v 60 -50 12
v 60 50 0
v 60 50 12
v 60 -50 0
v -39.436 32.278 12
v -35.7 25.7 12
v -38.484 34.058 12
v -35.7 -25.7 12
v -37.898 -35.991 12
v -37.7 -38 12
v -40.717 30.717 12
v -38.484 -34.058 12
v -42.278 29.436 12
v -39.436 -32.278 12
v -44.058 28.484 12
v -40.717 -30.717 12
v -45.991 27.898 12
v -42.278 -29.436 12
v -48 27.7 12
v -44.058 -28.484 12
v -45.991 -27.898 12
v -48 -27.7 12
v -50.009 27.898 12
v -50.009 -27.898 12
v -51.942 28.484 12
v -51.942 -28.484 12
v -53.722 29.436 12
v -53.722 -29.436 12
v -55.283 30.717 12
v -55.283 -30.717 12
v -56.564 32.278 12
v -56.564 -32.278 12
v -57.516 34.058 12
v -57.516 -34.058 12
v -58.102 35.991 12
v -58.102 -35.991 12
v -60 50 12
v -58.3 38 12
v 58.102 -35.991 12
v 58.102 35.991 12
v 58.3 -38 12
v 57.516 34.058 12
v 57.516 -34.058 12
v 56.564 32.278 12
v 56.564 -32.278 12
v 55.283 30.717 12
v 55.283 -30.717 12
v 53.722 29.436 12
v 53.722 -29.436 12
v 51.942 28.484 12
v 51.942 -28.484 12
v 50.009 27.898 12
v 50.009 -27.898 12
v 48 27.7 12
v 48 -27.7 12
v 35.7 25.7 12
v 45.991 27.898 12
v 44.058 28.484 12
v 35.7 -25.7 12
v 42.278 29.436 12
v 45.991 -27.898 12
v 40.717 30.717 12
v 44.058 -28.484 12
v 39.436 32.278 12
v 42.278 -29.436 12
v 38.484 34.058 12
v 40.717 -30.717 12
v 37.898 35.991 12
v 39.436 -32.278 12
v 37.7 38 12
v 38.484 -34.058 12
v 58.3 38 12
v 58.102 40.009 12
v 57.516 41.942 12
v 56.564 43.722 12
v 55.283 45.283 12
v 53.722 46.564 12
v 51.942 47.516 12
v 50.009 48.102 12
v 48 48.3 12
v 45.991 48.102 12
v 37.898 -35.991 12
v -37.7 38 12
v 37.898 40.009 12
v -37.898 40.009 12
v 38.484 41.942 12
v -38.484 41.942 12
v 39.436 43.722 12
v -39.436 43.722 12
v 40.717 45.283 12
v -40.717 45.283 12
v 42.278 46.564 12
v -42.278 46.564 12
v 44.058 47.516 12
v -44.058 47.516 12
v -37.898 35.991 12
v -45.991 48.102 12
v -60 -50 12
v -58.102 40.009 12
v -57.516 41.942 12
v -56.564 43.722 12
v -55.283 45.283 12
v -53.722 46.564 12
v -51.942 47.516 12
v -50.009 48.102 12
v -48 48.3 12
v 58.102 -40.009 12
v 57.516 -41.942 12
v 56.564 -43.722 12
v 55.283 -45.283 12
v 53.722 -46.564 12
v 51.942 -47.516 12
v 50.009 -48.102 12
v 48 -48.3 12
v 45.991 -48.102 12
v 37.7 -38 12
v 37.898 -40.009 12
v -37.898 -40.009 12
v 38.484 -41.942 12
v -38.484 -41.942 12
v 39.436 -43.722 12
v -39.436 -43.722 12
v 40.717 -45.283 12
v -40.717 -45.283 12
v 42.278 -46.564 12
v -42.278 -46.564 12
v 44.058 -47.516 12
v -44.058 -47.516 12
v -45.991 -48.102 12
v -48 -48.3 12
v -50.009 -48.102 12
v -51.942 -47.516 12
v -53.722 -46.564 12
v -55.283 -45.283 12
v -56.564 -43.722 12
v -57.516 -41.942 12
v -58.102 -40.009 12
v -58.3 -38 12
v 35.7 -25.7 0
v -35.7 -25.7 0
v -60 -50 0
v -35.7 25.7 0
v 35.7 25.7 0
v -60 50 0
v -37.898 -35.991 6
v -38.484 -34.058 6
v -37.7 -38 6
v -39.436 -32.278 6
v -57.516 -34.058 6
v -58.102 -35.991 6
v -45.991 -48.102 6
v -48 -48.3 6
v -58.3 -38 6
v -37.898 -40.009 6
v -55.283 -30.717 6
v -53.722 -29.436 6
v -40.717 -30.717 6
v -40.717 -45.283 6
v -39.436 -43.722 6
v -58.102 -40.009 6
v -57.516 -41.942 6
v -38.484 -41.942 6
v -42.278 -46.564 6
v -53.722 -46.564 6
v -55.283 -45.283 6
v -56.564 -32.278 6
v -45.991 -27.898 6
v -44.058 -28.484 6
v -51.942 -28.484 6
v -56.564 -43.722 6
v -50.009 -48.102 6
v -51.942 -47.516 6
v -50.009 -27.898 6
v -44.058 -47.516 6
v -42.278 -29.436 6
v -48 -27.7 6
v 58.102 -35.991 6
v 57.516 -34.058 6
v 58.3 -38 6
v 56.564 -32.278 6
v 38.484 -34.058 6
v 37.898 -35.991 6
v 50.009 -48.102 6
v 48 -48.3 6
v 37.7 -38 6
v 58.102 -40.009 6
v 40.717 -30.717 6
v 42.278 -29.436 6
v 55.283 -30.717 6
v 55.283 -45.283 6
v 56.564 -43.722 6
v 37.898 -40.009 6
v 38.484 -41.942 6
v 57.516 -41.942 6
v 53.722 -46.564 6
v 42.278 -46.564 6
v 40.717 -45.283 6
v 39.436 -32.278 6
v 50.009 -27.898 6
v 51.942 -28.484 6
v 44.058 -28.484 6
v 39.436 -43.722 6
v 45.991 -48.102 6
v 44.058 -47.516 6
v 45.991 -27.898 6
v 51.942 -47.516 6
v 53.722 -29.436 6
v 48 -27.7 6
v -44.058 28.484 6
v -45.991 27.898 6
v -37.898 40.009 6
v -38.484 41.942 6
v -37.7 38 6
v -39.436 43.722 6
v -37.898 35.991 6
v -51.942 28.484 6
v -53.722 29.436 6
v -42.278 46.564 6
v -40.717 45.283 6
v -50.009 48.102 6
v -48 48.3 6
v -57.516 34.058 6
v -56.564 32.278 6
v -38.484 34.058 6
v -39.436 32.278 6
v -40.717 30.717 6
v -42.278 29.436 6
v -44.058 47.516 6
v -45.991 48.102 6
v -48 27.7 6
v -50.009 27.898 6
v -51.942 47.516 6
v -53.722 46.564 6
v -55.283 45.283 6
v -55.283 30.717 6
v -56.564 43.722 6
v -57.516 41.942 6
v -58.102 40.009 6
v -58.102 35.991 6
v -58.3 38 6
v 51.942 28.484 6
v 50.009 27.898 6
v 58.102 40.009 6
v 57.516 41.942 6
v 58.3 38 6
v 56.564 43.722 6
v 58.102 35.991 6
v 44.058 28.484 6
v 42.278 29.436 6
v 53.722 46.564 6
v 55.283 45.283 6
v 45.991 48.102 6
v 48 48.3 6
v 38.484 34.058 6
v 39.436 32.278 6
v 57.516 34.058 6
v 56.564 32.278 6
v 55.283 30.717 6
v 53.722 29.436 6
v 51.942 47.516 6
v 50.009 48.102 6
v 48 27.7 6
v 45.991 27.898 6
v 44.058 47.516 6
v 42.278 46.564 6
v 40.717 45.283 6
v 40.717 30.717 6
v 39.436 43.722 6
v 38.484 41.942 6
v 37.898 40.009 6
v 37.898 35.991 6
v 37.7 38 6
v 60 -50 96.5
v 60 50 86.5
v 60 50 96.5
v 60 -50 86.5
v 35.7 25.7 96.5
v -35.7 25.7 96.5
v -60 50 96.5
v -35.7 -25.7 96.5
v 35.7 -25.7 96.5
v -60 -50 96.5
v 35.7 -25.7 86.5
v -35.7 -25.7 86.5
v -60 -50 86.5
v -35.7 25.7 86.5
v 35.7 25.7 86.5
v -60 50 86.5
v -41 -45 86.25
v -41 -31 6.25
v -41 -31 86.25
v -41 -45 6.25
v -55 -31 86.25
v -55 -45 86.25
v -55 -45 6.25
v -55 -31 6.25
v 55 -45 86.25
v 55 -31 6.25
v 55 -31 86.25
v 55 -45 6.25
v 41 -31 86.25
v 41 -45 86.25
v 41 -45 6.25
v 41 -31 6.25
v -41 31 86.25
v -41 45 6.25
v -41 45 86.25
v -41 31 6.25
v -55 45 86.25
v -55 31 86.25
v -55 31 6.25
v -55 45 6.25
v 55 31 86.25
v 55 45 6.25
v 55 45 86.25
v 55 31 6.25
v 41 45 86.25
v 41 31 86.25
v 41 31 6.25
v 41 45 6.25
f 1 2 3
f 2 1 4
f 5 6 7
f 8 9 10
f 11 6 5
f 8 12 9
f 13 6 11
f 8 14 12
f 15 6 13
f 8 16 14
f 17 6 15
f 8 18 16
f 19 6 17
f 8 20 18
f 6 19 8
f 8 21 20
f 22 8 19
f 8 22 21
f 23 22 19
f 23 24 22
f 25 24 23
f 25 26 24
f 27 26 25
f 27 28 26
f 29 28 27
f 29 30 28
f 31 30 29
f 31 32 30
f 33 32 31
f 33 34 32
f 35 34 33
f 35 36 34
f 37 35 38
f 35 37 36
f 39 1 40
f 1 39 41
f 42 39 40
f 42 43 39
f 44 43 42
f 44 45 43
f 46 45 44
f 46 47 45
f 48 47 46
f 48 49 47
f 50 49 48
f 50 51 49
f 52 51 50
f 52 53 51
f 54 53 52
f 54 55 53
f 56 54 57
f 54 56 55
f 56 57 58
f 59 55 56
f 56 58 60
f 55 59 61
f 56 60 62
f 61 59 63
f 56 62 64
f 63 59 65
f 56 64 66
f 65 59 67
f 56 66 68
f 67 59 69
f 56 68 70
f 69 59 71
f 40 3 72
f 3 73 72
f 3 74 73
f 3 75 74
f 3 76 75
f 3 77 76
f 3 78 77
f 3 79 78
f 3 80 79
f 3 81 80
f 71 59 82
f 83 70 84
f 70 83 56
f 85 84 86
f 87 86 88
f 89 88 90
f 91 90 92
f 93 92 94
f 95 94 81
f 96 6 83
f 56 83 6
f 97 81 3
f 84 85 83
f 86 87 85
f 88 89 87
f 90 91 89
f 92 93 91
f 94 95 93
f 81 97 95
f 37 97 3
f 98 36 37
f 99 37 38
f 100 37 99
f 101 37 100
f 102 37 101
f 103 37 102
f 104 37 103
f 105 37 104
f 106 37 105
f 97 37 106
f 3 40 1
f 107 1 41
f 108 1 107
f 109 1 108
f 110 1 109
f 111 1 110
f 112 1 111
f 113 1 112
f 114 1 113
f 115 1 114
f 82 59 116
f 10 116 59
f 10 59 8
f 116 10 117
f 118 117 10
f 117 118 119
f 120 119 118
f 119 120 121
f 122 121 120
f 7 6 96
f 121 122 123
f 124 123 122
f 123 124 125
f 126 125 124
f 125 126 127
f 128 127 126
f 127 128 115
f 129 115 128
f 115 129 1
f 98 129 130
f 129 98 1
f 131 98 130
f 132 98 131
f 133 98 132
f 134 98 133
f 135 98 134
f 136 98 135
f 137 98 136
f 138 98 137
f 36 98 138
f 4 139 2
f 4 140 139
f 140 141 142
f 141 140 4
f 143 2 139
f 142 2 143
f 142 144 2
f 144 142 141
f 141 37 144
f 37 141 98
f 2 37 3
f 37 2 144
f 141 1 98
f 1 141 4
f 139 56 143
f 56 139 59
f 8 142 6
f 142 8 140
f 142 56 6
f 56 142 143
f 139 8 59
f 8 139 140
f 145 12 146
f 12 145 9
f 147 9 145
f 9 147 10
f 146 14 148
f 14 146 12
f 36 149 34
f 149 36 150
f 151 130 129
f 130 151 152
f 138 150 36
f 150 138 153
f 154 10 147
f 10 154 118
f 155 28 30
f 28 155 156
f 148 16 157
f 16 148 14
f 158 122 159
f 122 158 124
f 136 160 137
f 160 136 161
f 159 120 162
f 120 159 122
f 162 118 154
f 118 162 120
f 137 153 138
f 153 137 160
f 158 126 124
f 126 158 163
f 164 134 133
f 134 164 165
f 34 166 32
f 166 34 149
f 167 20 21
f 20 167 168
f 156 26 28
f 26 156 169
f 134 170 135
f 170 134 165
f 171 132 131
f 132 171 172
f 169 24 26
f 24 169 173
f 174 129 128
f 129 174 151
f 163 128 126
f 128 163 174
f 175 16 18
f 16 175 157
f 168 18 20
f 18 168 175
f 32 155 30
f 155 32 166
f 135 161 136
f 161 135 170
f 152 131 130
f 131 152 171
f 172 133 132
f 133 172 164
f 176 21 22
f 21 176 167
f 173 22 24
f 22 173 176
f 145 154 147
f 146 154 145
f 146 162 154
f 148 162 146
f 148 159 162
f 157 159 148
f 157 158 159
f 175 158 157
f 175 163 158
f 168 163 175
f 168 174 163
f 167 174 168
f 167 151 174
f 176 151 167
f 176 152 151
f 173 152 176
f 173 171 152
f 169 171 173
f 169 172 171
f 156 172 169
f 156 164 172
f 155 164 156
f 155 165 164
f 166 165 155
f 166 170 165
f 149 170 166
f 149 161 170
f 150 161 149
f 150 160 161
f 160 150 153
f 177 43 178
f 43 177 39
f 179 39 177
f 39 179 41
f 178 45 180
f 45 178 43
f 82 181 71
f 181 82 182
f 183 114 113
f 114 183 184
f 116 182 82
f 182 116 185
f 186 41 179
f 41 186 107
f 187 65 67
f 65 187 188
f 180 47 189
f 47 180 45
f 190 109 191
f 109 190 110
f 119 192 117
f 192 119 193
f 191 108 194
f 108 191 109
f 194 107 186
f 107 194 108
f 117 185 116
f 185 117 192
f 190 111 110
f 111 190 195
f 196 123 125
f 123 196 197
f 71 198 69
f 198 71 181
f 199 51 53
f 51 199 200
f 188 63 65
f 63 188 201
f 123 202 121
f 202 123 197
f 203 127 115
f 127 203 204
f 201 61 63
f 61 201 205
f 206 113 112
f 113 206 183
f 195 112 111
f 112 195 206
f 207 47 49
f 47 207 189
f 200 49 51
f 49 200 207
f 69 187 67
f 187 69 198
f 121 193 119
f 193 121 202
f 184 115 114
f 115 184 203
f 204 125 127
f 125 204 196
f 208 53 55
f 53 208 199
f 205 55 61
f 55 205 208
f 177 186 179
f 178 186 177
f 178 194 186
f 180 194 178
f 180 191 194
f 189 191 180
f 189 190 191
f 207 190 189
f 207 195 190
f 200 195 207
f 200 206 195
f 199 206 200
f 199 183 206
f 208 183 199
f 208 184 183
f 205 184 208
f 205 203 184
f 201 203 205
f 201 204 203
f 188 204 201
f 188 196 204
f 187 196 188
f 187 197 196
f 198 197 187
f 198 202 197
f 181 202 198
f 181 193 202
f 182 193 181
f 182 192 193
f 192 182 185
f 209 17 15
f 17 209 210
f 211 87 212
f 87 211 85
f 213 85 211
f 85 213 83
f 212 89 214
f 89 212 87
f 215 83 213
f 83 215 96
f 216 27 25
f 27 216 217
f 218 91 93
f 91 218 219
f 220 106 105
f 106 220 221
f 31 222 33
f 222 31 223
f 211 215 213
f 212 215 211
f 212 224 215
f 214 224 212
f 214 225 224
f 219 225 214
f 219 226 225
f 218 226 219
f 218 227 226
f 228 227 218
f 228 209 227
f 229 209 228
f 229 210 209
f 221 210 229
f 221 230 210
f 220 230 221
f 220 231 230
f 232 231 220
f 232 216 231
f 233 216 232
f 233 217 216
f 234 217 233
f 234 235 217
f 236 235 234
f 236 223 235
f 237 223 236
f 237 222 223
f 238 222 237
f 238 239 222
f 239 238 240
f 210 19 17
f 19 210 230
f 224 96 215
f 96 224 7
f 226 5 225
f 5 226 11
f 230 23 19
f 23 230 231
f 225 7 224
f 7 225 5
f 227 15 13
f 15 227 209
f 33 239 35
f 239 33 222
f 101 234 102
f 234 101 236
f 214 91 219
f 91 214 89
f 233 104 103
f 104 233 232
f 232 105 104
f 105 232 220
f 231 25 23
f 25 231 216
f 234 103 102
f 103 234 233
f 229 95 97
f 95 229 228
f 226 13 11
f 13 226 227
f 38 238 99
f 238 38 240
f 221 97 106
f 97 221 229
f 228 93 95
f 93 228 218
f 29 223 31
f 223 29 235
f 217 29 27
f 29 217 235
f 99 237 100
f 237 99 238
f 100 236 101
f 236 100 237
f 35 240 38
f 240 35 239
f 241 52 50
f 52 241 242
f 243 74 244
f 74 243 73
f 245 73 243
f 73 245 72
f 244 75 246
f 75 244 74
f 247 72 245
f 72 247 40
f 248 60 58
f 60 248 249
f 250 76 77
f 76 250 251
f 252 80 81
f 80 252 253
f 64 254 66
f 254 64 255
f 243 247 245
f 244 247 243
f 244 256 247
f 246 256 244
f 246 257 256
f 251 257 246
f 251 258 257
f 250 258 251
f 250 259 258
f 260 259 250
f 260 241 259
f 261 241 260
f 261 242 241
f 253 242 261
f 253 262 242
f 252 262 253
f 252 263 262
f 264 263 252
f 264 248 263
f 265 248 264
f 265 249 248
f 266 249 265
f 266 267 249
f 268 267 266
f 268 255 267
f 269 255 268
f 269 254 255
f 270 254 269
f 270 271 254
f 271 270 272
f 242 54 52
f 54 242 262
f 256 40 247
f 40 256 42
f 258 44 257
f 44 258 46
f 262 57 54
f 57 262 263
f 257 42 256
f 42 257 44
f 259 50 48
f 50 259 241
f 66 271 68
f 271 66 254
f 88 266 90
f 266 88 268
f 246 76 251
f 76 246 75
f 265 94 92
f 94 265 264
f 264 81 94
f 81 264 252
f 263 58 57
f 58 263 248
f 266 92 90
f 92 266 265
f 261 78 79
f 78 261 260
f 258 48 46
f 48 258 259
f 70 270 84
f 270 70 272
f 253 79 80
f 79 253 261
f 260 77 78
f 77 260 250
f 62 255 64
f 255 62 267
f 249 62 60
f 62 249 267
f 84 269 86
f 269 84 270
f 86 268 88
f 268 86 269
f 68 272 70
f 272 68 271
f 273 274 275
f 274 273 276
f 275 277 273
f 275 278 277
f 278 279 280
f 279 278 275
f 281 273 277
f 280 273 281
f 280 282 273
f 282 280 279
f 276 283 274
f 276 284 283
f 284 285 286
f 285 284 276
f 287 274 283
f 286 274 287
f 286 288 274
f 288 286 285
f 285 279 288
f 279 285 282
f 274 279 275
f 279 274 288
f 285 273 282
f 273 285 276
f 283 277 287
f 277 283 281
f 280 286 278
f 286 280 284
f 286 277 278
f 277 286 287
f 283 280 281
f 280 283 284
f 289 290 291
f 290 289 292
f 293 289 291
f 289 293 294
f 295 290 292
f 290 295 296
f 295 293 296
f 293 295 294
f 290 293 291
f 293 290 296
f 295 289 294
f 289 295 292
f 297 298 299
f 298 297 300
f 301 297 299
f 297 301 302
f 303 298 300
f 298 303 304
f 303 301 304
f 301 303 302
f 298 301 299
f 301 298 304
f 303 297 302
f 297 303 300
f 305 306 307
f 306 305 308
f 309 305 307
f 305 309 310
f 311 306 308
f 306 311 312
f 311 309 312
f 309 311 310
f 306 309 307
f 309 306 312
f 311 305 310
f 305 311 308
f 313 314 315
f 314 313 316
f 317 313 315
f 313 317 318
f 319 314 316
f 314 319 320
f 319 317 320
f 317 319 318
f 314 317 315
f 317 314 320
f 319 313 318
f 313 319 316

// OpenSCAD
$fn = 32;

// ------------------------------------------------------------------------
// Frame cube: base 120 x 100 mm, posts 80 mm tall
// Every part is its own module, assembly() places every instance.
// ------------------------------------------------------------------------

// --- part 1 ---
module base_frame() {
  difference() {
    translate([-60, -50, 0]) cube([120, 100, 12]);
    translate([-35.7, -25.7, -1]) cube([71.4, 51.4, 14]);
    translate([-48, -38, 6]) cylinder(h = 7, d = 20.6);
    translate([48, -38, 6]) cylinder(h = 7, d = 20.6);
    translate([-48, 38, 6]) cylinder(h = 7, d = 20.6);
    translate([48, 38, 6]) cylinder(h = 7, d = 20.6);
  }
}

// --- part 2 ---
module corner_post() {
  translate([-7, -7, 0]) cube([14, 14, 80]);
}

// --- part 3 ---
module top_frame() {
  difference() {
    translate([-60, -50, 0]) cube([120, 100, 10]);
    translate([-35.7, -25.7, -1]) cube([71.4, 51.4, 12]);
  }
}

// --- assembly ---
module assembly() {
  color([0.80, 0.24, 0.20]) translate([0, 0, 0]) rotate([0, 0, 0]) base_frame();
  color([0.20, 0.45, 0.75]) translate([-48, -38, 6.25]) rotate([0, 0, 0]) corner_post();
  color([0.25, 0.62, 0.32]) translate([48, -38, 6.25]) rotate([0, 0, 0]) corner_post();
  color([0.92, 0.70, 0.18]) translate([-48, 38, 6.25]) rotate([0, 0, 0]) corner_post();
  color([0.58, 0.35, 0.70]) translate([48, 38, 6.25]) rotate([0, 0, 0]) corner_post();
  color([0.16, 0.66, 0.66]) translate([0, 0, 86.5]) rotate([0, 0, 0]) top_frame();
}

assembly();
